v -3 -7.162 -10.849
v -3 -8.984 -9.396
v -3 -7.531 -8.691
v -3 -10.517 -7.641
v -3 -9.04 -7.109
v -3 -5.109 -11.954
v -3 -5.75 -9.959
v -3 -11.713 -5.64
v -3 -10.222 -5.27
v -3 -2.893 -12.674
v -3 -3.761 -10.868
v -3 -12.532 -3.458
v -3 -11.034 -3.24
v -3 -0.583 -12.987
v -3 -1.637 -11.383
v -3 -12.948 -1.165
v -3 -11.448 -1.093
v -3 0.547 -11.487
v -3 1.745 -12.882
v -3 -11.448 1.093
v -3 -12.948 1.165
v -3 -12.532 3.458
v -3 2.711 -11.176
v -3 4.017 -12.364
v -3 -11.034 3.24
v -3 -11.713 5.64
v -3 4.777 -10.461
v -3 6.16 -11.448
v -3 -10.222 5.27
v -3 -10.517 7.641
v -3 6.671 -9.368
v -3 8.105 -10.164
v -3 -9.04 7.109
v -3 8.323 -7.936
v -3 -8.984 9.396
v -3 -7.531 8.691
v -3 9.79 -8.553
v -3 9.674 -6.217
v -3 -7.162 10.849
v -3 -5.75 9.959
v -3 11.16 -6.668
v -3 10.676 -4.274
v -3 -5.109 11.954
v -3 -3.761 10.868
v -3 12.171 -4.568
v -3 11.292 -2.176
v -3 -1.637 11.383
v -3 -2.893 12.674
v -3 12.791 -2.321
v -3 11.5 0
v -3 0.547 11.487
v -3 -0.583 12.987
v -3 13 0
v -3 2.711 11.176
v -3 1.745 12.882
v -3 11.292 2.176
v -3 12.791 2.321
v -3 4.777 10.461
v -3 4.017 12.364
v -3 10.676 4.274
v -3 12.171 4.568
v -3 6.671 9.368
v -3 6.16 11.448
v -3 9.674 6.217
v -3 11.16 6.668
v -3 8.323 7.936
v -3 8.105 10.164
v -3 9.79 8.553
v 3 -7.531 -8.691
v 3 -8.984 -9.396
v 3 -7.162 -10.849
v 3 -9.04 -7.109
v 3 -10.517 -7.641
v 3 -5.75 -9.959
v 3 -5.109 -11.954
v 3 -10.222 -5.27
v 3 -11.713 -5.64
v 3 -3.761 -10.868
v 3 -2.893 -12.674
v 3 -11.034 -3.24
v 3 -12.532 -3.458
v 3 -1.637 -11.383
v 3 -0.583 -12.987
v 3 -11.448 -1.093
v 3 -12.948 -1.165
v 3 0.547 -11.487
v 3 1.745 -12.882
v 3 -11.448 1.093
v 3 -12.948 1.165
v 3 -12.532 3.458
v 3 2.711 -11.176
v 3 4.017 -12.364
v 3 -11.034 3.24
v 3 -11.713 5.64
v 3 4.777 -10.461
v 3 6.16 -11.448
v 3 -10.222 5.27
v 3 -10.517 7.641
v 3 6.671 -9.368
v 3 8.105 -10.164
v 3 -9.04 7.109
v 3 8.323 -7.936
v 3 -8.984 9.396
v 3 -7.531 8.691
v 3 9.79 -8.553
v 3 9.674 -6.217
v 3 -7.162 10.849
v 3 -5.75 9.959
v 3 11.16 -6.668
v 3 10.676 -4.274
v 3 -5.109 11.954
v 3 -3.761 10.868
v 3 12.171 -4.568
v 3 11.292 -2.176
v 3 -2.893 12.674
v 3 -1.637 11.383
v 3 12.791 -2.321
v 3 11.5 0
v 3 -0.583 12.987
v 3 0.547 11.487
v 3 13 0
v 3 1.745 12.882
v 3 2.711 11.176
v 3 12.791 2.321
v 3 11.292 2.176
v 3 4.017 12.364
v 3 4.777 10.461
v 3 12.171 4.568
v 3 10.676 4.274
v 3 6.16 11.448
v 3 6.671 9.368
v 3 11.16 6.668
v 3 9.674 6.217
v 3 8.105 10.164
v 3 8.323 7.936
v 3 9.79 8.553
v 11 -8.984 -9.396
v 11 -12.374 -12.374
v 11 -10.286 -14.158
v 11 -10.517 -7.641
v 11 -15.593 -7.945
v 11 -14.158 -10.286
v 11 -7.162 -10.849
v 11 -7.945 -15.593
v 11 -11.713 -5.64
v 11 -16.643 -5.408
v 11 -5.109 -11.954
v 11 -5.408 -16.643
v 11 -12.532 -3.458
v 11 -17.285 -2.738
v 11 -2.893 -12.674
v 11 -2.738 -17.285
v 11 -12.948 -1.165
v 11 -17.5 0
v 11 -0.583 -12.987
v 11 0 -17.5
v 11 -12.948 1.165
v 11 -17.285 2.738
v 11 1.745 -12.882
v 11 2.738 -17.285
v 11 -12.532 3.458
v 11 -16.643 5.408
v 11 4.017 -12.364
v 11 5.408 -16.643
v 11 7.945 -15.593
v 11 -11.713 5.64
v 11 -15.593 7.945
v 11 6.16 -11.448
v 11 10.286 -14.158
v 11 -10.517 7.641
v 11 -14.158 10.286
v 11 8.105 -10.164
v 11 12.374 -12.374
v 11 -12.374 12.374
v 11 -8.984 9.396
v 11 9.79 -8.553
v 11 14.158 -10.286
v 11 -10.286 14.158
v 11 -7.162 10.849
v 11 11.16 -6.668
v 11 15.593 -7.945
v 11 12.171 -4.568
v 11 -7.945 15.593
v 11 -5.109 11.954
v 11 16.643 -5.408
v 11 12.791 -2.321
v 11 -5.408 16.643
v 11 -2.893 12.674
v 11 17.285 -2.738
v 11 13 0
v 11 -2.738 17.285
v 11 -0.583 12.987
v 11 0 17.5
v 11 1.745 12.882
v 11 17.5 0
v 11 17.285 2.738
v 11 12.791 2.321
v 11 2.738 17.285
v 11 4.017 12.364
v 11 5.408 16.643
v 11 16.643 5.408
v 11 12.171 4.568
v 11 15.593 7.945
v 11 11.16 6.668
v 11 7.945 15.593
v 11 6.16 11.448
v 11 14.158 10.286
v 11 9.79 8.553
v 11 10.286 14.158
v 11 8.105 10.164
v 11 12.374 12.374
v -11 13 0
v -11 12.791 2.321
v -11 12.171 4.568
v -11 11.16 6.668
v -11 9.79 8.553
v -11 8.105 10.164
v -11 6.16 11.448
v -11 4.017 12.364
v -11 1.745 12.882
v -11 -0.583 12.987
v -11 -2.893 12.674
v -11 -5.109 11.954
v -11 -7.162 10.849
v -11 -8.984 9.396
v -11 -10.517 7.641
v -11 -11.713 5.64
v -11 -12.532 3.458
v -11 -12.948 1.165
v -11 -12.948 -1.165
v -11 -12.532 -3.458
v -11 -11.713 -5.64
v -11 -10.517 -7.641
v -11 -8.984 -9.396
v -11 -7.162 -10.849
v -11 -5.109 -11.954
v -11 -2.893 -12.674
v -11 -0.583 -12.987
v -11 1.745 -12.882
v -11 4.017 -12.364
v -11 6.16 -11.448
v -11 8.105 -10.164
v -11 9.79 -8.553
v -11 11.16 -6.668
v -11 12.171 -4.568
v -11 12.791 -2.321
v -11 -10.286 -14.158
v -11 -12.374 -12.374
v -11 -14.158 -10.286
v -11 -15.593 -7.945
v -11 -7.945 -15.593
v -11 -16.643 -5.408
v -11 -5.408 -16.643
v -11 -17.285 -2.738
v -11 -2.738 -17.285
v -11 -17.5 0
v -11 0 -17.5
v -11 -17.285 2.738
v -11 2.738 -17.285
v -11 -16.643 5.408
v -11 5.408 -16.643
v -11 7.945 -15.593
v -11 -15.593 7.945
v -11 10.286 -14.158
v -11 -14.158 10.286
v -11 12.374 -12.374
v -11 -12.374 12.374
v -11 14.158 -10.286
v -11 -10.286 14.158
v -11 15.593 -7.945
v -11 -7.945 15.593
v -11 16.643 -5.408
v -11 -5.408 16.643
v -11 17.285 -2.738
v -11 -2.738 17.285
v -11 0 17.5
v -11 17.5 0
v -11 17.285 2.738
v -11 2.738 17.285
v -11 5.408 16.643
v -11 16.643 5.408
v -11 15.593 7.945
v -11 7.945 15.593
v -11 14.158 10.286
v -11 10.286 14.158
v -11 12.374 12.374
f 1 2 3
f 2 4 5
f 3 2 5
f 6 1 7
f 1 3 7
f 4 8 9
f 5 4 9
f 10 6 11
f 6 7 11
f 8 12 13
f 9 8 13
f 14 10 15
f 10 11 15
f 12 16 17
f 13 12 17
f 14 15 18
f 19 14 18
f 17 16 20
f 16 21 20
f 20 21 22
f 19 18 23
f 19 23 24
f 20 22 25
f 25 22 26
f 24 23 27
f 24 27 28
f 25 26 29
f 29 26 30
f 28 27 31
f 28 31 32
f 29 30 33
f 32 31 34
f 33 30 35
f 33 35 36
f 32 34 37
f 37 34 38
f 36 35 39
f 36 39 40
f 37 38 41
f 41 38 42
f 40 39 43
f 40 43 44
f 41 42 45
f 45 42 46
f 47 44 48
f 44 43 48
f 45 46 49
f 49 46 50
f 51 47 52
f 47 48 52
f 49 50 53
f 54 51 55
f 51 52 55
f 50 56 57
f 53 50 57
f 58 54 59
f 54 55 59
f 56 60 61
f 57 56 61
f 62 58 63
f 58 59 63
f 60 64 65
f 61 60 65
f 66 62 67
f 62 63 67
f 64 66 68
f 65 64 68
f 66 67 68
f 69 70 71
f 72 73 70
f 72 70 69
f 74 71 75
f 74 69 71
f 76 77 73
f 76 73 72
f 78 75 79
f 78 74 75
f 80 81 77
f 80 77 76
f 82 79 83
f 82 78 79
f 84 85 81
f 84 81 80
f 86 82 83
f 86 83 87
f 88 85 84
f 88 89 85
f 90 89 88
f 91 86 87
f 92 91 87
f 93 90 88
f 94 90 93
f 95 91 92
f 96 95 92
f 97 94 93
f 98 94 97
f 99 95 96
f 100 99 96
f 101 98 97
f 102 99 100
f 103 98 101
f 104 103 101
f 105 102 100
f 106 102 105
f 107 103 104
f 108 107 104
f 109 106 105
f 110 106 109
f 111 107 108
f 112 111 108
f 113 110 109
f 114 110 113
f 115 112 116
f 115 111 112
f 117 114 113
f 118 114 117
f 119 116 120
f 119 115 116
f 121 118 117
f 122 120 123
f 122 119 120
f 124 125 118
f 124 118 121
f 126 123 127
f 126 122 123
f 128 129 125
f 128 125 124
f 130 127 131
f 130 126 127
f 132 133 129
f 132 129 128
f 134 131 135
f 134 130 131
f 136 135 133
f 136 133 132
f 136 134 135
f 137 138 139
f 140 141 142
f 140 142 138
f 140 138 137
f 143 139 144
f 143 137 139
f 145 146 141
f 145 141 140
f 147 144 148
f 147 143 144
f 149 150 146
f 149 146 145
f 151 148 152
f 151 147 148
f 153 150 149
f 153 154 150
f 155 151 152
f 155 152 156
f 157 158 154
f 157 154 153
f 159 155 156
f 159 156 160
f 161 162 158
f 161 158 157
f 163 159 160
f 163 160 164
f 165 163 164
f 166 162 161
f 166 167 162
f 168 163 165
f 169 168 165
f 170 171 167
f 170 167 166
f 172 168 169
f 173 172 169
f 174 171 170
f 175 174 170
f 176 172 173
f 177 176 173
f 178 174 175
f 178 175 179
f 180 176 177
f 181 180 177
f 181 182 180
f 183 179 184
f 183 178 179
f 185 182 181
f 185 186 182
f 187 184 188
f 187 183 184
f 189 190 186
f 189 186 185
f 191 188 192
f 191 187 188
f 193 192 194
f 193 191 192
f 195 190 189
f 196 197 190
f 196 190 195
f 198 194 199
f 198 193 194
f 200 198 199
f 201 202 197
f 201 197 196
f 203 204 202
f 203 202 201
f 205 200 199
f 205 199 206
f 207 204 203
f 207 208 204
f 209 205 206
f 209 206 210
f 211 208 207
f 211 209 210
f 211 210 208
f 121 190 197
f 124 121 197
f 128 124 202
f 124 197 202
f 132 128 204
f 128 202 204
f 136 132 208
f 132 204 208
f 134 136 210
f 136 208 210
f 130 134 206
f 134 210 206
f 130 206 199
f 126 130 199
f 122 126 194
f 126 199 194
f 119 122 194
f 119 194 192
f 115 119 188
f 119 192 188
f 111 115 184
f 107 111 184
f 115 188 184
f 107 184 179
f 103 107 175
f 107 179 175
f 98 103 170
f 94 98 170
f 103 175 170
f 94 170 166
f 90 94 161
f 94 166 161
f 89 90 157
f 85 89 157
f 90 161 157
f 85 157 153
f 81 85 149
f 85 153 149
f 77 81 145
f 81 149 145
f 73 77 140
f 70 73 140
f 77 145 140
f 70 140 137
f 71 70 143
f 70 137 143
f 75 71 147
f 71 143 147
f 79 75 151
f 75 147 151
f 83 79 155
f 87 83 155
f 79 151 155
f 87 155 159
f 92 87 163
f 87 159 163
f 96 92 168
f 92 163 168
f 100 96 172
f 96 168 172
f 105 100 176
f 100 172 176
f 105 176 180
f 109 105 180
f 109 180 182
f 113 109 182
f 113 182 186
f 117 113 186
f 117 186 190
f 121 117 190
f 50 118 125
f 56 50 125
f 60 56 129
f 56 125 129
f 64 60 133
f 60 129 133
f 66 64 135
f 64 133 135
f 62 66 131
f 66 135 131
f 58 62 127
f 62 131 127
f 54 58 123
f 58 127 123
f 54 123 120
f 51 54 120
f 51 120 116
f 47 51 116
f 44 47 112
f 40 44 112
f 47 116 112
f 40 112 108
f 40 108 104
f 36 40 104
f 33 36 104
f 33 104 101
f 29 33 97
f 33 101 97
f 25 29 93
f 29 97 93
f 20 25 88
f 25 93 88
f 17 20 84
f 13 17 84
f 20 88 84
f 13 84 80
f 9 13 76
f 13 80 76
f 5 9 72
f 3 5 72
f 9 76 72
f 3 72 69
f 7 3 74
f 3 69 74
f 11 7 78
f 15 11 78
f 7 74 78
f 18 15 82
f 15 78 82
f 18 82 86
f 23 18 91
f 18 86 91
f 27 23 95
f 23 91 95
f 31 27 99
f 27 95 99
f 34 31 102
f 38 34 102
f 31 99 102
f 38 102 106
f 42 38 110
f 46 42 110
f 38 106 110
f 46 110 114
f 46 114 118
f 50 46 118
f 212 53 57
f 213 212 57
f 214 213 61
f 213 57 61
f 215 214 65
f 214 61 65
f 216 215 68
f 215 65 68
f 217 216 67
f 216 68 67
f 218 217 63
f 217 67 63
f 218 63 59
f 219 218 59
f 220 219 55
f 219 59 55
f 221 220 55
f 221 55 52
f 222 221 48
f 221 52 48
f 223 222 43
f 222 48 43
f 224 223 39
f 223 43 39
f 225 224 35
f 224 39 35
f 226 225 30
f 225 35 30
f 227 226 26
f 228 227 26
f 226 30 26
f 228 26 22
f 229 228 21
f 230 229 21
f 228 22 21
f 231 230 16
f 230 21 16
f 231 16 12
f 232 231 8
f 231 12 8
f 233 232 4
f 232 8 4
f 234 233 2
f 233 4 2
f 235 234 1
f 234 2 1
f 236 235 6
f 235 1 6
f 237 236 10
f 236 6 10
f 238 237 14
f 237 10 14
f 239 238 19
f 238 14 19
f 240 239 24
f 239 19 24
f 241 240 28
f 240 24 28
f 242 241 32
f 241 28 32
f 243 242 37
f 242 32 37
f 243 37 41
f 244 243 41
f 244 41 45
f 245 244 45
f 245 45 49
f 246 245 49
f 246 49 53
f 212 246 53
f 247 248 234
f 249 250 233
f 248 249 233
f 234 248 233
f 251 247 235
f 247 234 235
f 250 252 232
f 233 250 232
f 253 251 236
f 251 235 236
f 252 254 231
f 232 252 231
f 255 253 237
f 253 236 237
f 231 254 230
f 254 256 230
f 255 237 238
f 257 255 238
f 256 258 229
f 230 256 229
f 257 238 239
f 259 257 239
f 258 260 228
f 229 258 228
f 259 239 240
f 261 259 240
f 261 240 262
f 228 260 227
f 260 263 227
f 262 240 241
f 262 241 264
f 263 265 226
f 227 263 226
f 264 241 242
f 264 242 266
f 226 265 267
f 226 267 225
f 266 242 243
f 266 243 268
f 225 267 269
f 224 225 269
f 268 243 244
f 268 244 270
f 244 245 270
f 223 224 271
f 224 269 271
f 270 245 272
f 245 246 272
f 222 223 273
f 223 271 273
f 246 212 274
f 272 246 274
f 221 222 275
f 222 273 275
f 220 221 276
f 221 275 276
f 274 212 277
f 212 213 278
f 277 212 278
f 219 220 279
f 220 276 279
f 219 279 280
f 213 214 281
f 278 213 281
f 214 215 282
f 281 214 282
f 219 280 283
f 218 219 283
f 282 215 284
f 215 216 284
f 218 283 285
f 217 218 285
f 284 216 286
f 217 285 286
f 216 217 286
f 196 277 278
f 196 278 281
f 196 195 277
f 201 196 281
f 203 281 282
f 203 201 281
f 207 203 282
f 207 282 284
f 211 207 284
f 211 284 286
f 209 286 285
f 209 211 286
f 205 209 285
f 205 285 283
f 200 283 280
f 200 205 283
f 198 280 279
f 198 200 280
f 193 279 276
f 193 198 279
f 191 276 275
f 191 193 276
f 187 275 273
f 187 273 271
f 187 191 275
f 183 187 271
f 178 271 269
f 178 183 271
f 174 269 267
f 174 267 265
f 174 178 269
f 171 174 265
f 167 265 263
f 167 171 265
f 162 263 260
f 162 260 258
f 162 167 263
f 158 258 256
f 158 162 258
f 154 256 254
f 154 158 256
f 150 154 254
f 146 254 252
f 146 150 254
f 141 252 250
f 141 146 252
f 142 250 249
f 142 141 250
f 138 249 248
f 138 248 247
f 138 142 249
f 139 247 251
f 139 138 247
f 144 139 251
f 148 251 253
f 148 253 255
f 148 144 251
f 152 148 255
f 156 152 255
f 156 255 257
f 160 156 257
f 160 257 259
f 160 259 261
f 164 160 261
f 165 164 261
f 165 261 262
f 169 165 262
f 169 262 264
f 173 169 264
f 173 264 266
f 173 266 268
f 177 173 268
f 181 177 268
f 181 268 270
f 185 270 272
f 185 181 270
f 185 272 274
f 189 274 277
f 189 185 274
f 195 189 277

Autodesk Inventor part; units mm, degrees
sketch "_____1" plane through (0, 0, 0) normal (0, 0, 1) x (1, 0, 0)
  line L0 (11, 0) -> (-11, 0)
  line L1 (-11, 0) -> (-11, 17.5)
  line L2 (-11, 17.5) -> (11, 17.5)
  line L3 (11, 17.5) -> (11, 0)
  line L4 (11, 0) -> (-11, 0)
revolve "Revolution1" add sketch "_____1" angle 360 about axis through (11, 0, 0) along (1, 0, 0)
sketch "_____3" plane through (0, 0, 0) normal (0, 0, 1) x (1, 0, 0)
  line L0 (11, 0) -> (-11, 0)
  line L1 (-11, 0) -> (-11, 13)
  line L2 (-11, 13) -> (-3, 13)
  line L3 (-3, 13) -> (-3, 11.5)
  line L4 (-3, 11.5) -> (3, 11.5)
  line L5 (3, 11.5) -> (3, 13)
  line L6 (3, 13) -> (11, 13)
  line L7 (11, 13) -> (11, 0)
  line L8 (11, 0) -> (-11, 0)
revolve "Revolution2" cut sketch "_____3" angle 360 about axis through (11, 0, 0) along (1, 0, 0)
ref_plane "b6000_1_XY" through (7, 0, 0) normal (1, 0, 0) x (0, 0, -1)
ref_plane "b6000_1_YZ" through (7, 0, 0) normal (0, 0, -1) x (0, 1, 0)
ref_plane "b6000_1_ZX" through (7, 0, 0) normal (0, 1, 0) x (1, 0, 0)
ref_plane "b6000_2_XY" through (-7, 0, 0) normal (1, 0, 0) x (0, 0, -1)
ref_plane "b6000_2_YZ" through (-7, 0, 0) normal (0, 0, -1) x (0, 1, 0)
ref_plane "b6000_2_ZX" through (-7, 0, 0) normal (0, 1, 0) x (1, 0, 0)
ref_plane "to_dummy_XY" through (0, 0, 0) normal (1, 0, 0) x (0, 0, -1)
ref_plane "to_dummy_YZ" through (0, 0, 0) normal (0, 0, -1) x (0, 1, 0)
ref_plane "to_dummy_ZX" through (0, 0, 0) normal (0, 1, 0) x (1, 0, 0)
properties part number "C-AFBD22-35W_bw"
